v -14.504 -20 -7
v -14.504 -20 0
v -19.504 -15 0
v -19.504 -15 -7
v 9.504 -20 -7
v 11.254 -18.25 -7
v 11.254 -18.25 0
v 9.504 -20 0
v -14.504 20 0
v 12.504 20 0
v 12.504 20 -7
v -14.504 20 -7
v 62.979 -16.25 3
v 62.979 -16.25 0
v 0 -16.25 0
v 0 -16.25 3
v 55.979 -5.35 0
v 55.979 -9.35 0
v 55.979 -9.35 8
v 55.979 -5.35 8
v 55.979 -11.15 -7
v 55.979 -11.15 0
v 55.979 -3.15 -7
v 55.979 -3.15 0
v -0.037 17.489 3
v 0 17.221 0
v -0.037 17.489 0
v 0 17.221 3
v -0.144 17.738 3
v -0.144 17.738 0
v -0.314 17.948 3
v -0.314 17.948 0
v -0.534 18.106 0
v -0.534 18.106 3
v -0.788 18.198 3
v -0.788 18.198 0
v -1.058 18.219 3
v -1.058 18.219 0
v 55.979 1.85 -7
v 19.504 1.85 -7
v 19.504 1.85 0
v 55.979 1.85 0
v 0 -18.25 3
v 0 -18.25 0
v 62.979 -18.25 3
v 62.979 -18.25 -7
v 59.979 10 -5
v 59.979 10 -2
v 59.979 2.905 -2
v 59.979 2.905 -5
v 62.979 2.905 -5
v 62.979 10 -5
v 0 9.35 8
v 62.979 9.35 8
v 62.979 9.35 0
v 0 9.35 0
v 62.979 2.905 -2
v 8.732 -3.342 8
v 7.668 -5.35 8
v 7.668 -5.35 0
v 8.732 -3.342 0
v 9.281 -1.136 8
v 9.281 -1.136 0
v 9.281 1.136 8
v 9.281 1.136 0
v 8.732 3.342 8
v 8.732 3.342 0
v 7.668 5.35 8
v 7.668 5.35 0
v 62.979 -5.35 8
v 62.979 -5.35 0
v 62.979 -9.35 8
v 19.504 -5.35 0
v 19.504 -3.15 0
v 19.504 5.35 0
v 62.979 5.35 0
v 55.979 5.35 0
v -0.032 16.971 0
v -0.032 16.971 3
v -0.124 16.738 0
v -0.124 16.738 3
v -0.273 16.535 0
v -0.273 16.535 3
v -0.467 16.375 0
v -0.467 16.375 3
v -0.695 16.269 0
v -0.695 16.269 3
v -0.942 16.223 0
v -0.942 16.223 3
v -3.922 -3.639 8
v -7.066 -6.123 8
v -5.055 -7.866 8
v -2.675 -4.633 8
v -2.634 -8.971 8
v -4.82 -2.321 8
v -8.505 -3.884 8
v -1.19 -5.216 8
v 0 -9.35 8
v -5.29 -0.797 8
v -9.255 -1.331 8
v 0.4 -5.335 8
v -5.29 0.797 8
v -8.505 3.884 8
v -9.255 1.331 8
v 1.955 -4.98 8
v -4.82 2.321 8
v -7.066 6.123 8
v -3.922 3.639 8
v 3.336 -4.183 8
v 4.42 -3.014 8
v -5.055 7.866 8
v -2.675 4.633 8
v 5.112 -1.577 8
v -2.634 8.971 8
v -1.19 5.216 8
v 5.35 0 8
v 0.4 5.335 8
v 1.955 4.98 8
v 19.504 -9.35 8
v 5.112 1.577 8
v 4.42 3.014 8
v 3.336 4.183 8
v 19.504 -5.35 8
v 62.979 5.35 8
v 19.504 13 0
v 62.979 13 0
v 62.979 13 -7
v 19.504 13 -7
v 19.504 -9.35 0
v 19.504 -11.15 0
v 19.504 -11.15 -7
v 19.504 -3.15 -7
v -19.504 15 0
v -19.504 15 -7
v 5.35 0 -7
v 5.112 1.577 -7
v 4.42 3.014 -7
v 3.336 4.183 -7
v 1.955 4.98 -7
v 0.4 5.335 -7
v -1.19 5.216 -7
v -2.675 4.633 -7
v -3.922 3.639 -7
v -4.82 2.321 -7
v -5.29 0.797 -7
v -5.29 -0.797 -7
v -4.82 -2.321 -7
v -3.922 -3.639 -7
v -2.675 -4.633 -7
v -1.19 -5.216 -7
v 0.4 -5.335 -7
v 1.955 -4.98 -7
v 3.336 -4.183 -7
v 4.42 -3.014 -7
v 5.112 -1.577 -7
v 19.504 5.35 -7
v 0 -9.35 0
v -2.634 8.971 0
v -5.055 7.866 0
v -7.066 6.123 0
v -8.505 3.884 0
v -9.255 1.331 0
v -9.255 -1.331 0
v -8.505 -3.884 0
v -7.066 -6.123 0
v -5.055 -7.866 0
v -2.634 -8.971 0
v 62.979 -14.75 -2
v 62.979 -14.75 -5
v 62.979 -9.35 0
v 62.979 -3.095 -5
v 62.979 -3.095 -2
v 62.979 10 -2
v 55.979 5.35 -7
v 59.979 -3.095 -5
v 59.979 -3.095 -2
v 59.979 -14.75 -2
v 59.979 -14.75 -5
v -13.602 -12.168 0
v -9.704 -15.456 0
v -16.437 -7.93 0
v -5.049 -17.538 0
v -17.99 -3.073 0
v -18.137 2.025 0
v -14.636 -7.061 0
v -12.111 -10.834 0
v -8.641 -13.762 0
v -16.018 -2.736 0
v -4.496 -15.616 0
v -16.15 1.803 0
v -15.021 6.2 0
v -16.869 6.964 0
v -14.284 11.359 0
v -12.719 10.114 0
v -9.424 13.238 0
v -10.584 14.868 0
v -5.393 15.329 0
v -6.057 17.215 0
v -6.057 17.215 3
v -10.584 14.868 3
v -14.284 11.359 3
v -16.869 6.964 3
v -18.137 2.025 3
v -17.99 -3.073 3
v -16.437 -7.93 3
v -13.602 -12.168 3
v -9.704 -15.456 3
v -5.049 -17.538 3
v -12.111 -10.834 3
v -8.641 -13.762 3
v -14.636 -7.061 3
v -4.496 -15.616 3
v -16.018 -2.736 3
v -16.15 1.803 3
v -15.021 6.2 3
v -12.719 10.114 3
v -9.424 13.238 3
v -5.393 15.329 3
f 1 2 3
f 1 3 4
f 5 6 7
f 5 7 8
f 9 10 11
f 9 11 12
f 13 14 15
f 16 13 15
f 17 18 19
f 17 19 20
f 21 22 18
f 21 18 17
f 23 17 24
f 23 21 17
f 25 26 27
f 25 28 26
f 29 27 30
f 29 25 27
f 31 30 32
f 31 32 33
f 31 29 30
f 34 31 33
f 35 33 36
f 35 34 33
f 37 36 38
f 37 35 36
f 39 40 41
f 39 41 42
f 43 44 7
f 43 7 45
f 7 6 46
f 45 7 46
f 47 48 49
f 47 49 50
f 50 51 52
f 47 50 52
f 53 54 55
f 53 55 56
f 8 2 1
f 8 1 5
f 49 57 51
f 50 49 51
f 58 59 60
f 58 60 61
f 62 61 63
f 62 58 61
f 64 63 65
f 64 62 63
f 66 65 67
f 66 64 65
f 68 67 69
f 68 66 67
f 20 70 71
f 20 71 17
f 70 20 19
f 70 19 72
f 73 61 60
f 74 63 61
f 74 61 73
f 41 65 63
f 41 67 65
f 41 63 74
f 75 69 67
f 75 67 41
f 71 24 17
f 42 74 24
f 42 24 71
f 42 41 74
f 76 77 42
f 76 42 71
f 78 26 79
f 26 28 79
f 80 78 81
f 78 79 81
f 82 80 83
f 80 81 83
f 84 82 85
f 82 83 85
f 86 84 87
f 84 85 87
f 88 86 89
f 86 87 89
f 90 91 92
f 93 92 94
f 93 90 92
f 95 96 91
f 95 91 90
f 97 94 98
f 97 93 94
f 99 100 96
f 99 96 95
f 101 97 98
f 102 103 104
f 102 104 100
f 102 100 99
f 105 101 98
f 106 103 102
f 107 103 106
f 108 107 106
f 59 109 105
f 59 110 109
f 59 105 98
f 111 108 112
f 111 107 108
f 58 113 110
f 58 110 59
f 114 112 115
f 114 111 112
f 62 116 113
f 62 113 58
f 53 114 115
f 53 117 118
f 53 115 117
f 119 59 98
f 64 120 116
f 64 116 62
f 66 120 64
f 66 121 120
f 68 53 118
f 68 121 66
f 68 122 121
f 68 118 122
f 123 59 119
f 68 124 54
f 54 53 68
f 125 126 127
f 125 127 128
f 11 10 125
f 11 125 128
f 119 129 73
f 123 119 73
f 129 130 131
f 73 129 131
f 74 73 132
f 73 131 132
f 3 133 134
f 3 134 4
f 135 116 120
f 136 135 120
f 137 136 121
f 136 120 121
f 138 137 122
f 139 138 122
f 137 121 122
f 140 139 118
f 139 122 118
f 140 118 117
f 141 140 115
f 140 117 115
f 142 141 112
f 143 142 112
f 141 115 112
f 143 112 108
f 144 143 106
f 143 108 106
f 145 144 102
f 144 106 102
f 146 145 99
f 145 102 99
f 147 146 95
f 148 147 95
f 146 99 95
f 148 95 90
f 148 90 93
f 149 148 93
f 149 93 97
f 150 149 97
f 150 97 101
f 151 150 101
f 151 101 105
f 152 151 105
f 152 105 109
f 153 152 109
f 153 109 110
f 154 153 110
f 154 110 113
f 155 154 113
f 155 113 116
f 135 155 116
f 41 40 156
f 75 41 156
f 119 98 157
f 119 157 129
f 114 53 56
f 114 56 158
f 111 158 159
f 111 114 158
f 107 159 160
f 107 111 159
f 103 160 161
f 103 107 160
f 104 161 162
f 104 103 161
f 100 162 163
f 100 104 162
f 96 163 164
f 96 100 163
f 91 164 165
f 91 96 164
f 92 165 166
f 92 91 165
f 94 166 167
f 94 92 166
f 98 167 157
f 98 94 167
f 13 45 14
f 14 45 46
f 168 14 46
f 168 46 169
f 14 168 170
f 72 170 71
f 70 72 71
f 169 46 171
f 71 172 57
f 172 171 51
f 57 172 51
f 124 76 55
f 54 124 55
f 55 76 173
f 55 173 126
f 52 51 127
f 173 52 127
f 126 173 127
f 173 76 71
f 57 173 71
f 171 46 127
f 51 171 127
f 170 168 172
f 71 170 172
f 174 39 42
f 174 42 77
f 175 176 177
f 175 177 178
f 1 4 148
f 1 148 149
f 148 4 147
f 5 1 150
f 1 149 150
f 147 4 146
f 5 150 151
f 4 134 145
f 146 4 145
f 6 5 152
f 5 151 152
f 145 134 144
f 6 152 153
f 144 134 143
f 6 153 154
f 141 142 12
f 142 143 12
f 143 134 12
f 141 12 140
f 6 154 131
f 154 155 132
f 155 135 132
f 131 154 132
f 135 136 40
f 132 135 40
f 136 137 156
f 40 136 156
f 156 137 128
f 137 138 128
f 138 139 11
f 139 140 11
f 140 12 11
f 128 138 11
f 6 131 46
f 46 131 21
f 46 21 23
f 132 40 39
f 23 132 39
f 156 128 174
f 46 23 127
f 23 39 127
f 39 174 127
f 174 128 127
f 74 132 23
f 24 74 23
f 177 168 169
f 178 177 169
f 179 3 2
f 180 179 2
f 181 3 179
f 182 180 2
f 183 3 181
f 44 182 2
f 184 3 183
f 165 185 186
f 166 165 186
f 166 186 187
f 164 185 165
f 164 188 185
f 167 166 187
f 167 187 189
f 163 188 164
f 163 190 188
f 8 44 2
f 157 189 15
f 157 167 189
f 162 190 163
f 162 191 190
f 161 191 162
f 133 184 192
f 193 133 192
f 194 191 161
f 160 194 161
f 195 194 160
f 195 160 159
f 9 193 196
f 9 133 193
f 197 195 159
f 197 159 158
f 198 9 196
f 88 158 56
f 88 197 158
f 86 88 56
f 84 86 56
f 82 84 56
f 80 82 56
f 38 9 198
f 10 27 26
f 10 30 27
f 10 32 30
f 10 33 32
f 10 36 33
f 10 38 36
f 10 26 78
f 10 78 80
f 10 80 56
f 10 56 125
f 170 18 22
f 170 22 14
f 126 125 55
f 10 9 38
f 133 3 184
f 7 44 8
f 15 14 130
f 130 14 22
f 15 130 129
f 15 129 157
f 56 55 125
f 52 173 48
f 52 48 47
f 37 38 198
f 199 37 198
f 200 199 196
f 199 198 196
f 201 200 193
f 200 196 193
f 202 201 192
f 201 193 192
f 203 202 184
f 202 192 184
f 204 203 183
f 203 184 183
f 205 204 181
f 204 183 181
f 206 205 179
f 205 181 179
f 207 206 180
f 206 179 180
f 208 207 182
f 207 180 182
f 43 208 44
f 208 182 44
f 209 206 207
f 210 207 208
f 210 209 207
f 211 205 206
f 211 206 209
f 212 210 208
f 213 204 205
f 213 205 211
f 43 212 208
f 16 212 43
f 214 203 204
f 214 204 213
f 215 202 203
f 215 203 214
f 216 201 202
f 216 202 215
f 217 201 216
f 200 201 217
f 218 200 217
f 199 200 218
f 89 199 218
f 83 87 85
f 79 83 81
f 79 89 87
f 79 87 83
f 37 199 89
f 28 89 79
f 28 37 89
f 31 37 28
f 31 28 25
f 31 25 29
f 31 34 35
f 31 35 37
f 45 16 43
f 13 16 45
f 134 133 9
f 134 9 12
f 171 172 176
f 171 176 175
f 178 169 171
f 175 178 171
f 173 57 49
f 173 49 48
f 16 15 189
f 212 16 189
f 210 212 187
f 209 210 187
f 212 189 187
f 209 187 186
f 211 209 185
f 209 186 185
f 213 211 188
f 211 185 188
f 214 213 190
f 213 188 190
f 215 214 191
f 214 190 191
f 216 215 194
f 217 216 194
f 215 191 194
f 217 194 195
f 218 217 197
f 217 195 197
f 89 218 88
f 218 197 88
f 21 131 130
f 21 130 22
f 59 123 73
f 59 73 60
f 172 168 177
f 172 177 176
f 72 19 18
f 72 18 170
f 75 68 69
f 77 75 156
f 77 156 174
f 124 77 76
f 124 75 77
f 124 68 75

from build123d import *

# Parameters (mm, degrees)
SKETCH1_R               = 5.35
BOSS_EXTRUDE2_DEPTH     = 7
BOSS_EXTRUDE3_START     = 8
SKETCH3_R               = 5.35
BOSS_EXTRUDE3_DEPTH     = 8
BOSS_EXTRUDE4_DEPTH     = 3
FILLET1_R               = 1
CHAMFER1_SIZE           = 10
CHAMFER2_SIZE           = 5
CUT_EXTRUDE1_DEPTH      = 67.560662475
CUT_EXTRUDE1_DEPTH_BACK = 67.560662475
SKETCH5_W               = 36.474956737
SKETCH5_H               = 3.5
SKETCH5_H_2             = 8
CHAMFER3_SIZE           = 7
SKETCH6_W               = 3
SKETCH6_H               = 7.094956055
SKETCH6_H_2             = 11.655043945
CUT_EXTRUDE2_DEPTH      = 3


# Some blends are built 0.0001 mm under size
with BuildPart() as part:
    # Sketch1 → Boss-Extrude2 (new body)
    with BuildSketch(Plane.XY):
        Polygon((-19.503784034, -20), (19.503784034, -20), (19.503784034, -18.25), (62.978740771, -18.25), (62.978740771, 13), (19.503784034, 13), (19.503784034, 20), (-19.503784034, 20), align=None)
        Circle(SKETCH1_R, mode=Mode.SUBTRACT)
    extrude(amount=-BOSS_EXTRUDE2_DEPTH)

    # Sketch3 → Boss-Extrude3 (add)
    with BuildSketch(Plane.XY.offset(BOSS_EXTRUDE3_START)):
        with BuildLine():
            Line((7.668115805, 5.35), (62.978740771, 5.35))
            Line((62.978740771, 5.35), (62.978740771, 9.35))
            Line((62.978740771, 9.35), (0, 9.35))
            ThreePointArc((0, 9.35), (-9.35, 0), (0, -9.35))
            Line((0, -9.35), (62.978740771, -9.35))
            Line((62.978740771, -9.35), (62.978740771, -5.35))
            Line((62.978740771, -5.35), (7.668115805, -5.35))
            ThreePointArc((7.668115805, -5.35), (9.35, 0), (7.668115805, 5.35))
        make_face()
        Circle(SKETCH3_R, mode=Mode.SUBTRACT)
    extrude(amount=-BOSS_EXTRUDE3_DEPTH)

    # Sketch4 → Boss-Extrude4 (add)
    with BuildSketch(Plane.XY):
        with BuildLine():
            Line((0, -18.25), (62.978740771, -18.25))
            Line((62.978740771, -18.25), (62.978740771, -16.25))
            Line((62.978740771, -16.25), (8.306623863, -16.25))
            Line((8.306623863, -16.25), (0, -16.25))
            ThreePointArc((0, -16.25), (-16.25, 0), (0, 16.25))
            Line((0, 16.25), (0, 18.25))
            ThreePointArc((0, 18.25), (-18.25, 0), (0, -18.25))
        make_face()
    extrude(amount=BOSS_EXTRUDE4_DEPTH)

    # Fillet1
    fillet1_edges = [part.edges().sort_by_distance(p)[0] for p in [
        (0, 16.25, 1.5),
        (0, 18.25, 1.5),
    ]]
    fillet(fillet1_edges, radius=FILLET1_R - 0.0001)  # a hair under: the kernel refuses the full size

    # Chamfer1
    # the kernel refuses this chamfer: 10 mm, written as the material it takes off along each edge
    with BuildSketch(Plane(origin=(19.503784034, -20, 25.71682988), x_dir=(0.027495876610586317, 0.9996219169112968, 0), z_dir=(0, 0, -1))) as chamfer1_piece_1_section:
        Polygon((CHAMFER1_SIZE * 0.999621916911, -CHAMFER1_SIZE * 0.0274958766106), (-CHAMFER1_SIZE * 0.0274958766106, -CHAMFER1_SIZE * 0.999621916911), (0, 0), align=None)
    chamfer1_piece_1 = extrude(amount=58.433659759, mode=Mode.PRIVATE)
    chamfer1_piece_1 = split(chamfer1_piece_1, bisect_by=Plane(origin=(14.814200223, -18.25, -3.5), z_dir=(0, -1, 0)), keep=Keep.TOP, mode=Mode.PRIVATE)
    add(chamfer1_piece_1, mode=Mode.SUBTRACT)

    # Chamfer2
    chamfer2_edges = [part.edges().sort_by_distance(p)[0] for p in [
        (-19.503784034, -20, -3.5),
        (-19.503784034, 20, -3.5),
    ]]
    chamfer(chamfer2_edges, length=CHAMFER2_SIZE)

    # Sketch5 → Cut-Extrude1 (cut, two sides: drawn at the far end of the back side and taken through both)
    with BuildSketch(Plane.XY.offset(-CUT_EXTRUDE1_DEPTH_BACK)):
        with Locations((37.741262403, 3.6)):
            Rectangle(SKETCH5_W, SKETCH5_H)
        with Locations((37.741262403, -7.15)):
            Rectangle(SKETCH5_W, SKETCH5_H_2)
    extrude(amount=CUT_EXTRUDE1_DEPTH + CUT_EXTRUDE1_DEPTH_BACK, mode=Mode.SUBTRACT)

    # Chamfer3
    chamfer3_edges = [part.edges().sort_by_distance(p)[0] for p in [
        (19.503784034, 20, -3.5),
    ]]
    chamfer(chamfer3_edges, length=CHAMFER3_SIZE - 0.0001)  # a hair under: the kernel refuses the full size

    # Sketch6 → Cut-Extrude2 (cut)
    with BuildSketch(Plane(origin=(62.978740771, 0, 0), x_dir=(0, 0, -1), z_dir=(1, 0, 0))):
        with Locations((3.5, 6.452521972)):
            Rectangle(SKETCH6_W, SKETCH6_H)
        with Locations((3.5, -8.922478028)):
            Rectangle(SKETCH6_W, SKETCH6_H_2)
    extrude(amount=-CUT_EXTRUDE2_DEPTH, mode=Mode.SUBTRACT)


solid = part.part
